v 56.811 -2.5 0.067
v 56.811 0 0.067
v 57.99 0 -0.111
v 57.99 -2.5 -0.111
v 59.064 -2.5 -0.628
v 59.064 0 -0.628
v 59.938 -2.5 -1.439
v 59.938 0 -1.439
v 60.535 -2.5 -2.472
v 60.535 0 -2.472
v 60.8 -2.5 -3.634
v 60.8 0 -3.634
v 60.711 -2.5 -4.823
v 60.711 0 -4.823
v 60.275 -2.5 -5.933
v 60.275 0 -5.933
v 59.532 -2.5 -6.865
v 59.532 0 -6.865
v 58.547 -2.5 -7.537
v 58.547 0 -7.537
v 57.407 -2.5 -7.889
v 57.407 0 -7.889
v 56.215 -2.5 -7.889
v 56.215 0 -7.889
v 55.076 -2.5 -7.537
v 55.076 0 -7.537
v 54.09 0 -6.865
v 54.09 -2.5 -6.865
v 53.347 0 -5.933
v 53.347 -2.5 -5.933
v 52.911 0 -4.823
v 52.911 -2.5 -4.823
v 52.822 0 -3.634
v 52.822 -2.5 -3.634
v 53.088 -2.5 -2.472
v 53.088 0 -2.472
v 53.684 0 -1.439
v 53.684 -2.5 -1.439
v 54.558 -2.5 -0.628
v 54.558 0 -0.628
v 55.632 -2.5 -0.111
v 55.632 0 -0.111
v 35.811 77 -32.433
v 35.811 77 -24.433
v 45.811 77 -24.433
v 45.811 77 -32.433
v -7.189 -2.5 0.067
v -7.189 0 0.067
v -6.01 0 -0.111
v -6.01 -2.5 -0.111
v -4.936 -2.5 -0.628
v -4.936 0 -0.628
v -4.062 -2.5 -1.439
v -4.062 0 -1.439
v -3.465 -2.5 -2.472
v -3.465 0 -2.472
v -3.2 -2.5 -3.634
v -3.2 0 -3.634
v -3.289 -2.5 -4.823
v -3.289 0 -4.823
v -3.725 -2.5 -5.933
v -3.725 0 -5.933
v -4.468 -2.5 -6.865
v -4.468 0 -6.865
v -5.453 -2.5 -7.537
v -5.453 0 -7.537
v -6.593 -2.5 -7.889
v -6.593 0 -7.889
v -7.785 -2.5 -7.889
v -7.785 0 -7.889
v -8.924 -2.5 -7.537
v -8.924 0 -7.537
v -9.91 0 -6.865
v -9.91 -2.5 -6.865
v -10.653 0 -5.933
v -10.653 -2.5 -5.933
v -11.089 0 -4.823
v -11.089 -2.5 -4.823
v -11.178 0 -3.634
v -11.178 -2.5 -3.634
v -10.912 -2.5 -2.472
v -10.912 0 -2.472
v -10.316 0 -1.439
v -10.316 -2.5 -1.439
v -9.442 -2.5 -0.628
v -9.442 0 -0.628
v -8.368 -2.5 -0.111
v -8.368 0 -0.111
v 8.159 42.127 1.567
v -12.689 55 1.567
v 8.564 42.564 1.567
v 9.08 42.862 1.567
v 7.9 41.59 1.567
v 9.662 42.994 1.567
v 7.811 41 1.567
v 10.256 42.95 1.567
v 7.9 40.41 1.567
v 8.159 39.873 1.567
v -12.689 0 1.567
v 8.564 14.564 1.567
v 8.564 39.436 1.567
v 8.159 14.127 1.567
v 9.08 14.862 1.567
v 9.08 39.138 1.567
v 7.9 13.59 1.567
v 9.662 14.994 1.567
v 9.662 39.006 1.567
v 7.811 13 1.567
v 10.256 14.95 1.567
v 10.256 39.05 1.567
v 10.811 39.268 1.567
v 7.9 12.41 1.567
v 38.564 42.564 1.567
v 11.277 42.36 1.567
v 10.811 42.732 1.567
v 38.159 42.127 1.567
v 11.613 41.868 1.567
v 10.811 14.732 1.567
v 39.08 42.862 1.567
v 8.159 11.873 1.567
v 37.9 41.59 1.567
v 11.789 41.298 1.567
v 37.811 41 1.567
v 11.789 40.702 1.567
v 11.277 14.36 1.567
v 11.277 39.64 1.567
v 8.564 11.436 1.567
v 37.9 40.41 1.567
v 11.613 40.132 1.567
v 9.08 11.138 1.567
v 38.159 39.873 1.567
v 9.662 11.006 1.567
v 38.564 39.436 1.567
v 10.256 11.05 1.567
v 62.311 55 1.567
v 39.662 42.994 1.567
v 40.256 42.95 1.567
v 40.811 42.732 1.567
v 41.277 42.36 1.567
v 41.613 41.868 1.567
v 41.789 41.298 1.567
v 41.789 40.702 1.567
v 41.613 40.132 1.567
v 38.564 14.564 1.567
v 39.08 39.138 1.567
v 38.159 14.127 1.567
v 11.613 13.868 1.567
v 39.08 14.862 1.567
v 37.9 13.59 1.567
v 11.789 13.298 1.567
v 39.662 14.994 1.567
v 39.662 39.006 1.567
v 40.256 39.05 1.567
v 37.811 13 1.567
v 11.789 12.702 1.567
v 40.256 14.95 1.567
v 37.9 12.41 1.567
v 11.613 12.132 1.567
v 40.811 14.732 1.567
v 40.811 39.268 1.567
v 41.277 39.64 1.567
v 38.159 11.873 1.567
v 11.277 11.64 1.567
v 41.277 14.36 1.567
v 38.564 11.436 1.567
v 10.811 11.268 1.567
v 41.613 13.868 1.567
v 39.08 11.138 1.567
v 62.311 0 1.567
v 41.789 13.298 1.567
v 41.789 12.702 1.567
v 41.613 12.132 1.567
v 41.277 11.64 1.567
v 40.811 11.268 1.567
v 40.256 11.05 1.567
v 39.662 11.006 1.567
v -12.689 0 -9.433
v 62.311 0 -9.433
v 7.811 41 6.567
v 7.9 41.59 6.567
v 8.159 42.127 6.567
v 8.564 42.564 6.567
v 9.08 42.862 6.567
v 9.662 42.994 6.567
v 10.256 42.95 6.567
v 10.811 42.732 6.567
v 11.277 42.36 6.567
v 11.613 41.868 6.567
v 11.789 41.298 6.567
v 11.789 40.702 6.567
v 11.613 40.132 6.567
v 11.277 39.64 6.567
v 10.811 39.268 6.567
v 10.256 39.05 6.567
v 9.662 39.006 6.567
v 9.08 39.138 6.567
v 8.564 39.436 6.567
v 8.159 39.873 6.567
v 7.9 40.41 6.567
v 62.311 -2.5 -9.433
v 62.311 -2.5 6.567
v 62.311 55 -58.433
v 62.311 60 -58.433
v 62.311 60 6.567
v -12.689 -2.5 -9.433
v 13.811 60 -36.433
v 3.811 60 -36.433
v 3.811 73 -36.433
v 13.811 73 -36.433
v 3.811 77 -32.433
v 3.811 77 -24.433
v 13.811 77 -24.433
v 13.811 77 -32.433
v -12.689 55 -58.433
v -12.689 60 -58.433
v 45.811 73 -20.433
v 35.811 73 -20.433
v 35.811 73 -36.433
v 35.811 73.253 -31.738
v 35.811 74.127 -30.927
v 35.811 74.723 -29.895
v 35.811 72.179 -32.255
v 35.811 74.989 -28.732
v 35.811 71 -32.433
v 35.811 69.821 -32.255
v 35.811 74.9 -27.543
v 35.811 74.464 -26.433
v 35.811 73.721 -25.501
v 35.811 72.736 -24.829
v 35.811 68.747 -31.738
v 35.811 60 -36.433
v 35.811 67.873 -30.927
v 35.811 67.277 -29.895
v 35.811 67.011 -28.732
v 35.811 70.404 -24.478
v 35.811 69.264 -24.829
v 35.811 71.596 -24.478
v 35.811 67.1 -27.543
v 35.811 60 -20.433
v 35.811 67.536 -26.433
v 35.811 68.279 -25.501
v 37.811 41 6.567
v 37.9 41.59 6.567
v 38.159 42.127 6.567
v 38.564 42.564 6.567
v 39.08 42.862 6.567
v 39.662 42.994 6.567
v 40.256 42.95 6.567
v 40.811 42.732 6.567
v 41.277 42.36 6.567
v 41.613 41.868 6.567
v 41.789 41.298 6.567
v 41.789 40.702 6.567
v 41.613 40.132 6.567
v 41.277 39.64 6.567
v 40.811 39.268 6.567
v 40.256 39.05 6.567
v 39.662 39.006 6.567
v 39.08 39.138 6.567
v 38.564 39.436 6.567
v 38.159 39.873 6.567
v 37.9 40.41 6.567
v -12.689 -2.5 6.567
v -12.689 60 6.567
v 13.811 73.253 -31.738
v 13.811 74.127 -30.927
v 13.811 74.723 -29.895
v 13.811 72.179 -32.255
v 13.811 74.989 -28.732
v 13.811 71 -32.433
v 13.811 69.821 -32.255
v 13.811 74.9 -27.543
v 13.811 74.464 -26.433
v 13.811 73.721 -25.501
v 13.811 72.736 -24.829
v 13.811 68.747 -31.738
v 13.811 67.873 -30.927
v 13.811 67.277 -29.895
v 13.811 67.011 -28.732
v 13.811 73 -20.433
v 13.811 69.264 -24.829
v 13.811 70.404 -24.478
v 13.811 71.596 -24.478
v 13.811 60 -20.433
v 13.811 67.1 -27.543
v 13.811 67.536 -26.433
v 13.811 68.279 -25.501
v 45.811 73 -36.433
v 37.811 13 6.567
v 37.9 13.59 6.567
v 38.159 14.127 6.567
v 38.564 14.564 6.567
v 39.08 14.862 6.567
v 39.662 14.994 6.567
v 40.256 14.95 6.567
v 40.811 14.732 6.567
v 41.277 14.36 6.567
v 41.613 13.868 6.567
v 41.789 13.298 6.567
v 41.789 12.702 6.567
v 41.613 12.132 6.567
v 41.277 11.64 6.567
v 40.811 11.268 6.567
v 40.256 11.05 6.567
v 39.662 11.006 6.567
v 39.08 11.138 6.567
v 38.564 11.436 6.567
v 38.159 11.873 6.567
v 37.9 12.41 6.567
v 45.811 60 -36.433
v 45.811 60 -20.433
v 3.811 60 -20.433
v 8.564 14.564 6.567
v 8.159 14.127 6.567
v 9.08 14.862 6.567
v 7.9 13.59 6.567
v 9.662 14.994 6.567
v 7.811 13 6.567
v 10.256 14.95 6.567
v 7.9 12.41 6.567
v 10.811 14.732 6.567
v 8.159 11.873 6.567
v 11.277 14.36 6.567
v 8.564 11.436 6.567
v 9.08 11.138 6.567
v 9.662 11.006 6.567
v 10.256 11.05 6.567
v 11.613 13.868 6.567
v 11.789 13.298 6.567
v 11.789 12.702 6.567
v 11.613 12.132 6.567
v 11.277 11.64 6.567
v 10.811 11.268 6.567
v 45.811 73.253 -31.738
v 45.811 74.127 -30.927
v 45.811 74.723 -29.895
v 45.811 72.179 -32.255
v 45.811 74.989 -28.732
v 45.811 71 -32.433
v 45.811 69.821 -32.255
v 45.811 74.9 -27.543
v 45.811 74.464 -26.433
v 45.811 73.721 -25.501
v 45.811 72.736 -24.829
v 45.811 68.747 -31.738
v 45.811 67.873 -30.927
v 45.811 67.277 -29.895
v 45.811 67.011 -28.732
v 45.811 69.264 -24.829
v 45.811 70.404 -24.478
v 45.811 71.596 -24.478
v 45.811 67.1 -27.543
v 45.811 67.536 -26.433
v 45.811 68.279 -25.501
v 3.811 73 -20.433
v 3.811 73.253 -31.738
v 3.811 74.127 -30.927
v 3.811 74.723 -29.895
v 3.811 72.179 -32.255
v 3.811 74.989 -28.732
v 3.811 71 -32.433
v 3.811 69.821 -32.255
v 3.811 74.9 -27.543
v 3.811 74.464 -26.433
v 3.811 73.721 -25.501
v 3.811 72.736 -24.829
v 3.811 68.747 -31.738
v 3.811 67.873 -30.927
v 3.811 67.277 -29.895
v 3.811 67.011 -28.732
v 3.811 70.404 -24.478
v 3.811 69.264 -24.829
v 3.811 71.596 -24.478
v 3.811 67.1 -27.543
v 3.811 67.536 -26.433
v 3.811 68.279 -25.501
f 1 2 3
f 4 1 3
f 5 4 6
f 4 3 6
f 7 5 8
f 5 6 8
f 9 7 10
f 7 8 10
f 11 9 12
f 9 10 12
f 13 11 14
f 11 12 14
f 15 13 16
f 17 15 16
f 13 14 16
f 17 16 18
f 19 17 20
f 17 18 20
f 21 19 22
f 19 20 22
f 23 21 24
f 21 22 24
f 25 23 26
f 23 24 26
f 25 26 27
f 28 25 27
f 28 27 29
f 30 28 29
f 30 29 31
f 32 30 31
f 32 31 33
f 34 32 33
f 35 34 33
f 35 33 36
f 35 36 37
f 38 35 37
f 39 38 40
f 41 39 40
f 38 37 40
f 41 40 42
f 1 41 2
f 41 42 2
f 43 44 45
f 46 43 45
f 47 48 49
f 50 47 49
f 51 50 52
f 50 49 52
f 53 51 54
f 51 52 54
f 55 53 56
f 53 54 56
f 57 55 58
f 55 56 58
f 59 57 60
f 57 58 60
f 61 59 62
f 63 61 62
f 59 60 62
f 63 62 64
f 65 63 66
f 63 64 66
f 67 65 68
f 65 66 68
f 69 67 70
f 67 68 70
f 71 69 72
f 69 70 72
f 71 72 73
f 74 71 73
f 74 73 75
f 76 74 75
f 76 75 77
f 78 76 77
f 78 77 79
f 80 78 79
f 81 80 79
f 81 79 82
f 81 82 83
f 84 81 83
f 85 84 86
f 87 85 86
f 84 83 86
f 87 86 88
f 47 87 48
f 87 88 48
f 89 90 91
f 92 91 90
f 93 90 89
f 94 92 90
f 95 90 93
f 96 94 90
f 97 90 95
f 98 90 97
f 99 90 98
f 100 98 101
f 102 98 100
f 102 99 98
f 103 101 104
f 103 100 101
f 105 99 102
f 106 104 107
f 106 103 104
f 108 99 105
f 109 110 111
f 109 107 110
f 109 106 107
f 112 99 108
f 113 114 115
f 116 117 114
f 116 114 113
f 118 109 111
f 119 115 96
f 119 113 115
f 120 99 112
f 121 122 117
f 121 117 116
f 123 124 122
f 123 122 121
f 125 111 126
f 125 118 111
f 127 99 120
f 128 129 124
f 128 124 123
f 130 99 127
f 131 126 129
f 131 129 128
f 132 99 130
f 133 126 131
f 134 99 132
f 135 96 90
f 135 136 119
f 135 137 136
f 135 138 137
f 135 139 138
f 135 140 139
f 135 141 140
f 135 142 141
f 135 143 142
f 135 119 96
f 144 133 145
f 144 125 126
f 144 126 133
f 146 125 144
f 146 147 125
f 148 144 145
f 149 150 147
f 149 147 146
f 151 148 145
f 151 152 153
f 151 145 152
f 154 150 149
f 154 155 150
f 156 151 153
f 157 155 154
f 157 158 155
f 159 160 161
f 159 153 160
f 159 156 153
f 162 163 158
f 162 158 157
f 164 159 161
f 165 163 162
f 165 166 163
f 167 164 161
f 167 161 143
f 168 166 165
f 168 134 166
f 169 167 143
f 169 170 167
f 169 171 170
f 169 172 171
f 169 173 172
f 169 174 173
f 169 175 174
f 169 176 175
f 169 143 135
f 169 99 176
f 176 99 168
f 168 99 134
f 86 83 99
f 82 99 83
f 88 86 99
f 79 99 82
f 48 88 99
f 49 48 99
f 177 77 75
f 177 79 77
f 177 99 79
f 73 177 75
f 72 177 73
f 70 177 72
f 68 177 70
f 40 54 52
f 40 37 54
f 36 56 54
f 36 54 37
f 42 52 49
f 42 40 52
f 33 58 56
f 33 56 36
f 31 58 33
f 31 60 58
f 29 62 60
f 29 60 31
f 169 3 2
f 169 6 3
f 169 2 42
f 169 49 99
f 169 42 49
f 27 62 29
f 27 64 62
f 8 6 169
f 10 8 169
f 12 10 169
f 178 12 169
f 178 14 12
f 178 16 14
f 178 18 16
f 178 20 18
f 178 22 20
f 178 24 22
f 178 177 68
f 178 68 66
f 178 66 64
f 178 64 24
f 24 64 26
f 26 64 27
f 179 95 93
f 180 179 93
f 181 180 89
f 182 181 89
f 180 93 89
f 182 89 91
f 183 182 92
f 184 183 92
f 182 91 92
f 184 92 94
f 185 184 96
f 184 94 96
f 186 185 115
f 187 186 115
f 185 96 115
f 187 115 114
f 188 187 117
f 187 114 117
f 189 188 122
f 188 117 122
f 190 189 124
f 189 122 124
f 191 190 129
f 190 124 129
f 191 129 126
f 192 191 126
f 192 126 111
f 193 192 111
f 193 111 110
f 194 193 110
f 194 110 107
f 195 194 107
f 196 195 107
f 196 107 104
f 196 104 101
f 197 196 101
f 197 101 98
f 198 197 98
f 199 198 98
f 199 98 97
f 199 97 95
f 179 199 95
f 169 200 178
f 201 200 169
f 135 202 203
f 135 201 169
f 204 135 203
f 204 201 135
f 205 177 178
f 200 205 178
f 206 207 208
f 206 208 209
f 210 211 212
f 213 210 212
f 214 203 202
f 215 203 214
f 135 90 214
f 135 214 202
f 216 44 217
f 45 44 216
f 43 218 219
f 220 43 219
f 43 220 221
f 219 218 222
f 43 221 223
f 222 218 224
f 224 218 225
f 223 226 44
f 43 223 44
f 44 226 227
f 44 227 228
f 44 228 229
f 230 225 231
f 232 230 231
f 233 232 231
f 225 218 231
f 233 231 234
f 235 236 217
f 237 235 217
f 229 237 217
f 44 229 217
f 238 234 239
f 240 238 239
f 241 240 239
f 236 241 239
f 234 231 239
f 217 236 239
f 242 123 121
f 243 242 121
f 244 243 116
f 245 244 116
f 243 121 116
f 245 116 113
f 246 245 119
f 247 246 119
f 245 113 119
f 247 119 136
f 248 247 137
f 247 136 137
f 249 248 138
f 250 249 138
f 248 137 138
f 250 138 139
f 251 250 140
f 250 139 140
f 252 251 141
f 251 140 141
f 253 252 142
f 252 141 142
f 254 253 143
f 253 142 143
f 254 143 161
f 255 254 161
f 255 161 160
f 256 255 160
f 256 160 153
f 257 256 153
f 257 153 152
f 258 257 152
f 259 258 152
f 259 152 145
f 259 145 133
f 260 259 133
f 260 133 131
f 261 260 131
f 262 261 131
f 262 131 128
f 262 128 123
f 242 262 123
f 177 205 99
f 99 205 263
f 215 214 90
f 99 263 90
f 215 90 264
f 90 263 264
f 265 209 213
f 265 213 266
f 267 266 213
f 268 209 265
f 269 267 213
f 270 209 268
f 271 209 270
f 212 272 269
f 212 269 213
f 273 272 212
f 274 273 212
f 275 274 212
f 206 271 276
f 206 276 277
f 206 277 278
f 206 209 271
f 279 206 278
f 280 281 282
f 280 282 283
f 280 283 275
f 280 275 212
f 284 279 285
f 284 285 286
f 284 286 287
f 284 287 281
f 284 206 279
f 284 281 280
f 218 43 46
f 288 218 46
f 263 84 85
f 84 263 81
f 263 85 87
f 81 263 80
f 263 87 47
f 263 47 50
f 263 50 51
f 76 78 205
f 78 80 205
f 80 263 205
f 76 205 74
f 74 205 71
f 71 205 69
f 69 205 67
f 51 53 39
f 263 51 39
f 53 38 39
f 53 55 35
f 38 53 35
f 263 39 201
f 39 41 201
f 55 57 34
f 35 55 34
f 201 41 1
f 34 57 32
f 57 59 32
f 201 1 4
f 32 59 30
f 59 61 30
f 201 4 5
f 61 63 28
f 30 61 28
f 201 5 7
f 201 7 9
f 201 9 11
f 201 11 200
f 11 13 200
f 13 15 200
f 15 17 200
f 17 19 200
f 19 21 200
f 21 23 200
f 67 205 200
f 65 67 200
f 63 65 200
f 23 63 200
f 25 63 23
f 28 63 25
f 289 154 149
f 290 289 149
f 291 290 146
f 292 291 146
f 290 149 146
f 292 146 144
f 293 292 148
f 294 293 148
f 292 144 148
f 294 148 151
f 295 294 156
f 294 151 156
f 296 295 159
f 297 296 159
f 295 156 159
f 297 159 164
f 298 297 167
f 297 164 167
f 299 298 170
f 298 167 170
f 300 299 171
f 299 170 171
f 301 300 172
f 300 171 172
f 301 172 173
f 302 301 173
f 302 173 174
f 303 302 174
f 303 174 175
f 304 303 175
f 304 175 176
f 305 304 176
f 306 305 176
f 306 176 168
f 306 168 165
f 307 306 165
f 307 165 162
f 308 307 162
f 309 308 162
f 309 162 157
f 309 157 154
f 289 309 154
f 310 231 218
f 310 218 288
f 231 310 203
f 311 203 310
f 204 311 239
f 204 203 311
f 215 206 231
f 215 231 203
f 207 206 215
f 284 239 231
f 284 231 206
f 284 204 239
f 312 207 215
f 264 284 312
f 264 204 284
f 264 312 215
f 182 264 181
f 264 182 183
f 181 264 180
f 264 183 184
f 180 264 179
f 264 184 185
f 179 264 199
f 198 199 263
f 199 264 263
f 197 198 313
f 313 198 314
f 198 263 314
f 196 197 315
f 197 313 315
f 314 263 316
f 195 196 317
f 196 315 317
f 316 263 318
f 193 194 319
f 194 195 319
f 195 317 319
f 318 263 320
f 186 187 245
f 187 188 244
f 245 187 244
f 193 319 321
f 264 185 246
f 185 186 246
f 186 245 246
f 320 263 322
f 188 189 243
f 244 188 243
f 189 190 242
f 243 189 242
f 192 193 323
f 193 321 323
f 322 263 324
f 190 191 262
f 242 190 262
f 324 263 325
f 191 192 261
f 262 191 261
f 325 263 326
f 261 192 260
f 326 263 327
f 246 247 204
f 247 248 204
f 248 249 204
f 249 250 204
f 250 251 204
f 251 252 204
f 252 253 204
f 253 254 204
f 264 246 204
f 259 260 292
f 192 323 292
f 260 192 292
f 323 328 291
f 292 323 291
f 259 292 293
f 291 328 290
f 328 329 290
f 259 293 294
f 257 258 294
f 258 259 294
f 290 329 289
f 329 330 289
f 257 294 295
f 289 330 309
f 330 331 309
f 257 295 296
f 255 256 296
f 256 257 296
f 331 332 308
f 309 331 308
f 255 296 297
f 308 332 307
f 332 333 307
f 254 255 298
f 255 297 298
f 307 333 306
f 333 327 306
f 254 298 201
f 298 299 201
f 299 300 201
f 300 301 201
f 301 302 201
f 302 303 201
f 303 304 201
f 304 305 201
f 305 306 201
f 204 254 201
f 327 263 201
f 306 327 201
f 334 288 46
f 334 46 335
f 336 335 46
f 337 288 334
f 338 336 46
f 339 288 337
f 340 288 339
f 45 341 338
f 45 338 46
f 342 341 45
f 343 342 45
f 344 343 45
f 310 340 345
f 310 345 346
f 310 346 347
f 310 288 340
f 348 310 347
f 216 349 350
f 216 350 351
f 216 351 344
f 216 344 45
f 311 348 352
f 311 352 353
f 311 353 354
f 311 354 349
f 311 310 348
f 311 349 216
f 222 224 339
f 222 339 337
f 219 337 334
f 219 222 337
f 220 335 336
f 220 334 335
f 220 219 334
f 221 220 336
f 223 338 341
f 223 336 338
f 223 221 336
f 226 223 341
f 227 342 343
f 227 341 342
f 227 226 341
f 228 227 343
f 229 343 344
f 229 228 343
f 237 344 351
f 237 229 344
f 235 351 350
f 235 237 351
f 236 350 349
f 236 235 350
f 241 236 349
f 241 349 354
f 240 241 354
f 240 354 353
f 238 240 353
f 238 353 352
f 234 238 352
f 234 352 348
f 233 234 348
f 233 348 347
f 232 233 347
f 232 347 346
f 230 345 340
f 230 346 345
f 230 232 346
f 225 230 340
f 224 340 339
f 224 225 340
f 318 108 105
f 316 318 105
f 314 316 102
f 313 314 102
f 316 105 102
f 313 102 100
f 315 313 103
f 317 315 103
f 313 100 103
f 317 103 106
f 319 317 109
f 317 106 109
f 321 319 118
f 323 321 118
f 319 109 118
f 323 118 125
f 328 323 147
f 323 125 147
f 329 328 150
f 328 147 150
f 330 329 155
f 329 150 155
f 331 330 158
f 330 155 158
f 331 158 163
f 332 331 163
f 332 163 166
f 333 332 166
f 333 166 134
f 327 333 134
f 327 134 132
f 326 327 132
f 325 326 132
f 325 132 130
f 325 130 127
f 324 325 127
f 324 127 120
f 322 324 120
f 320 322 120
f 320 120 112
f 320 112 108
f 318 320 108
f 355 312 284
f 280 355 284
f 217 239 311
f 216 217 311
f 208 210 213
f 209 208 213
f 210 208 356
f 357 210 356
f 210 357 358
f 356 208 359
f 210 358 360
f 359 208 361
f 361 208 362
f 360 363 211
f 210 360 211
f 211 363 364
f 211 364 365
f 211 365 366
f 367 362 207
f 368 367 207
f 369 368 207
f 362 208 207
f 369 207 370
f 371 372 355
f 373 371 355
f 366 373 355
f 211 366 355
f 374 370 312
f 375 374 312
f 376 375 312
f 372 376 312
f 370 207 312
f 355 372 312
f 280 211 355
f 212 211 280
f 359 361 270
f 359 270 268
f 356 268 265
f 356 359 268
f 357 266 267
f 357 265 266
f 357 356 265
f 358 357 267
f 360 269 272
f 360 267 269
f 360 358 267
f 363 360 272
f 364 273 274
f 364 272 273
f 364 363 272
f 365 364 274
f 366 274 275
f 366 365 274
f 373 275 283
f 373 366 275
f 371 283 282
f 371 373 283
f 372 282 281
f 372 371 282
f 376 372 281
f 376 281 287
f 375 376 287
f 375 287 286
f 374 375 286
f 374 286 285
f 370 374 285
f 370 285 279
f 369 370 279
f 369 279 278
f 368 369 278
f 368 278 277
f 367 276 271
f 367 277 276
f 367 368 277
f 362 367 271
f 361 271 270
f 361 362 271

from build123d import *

# Parameters (mm, degrees)
SKETCH_1_W               = 75
SKETCH_1_H               = 16
SKETCH_1_R               = 4
EXTRUDE_1_DEPTH          = 2.5
SKETCH_3_W               = 75
SKETCH_3_H               = 5
EXTRUDE_2_DEPTH          = 60
CUT_EXTRUDE_1_REACH      = 89.199
SKETCH_4_R               = 2
SKETCH_5_W               = 75
SKETCH_5_H               = 5
EXTRUDE_3_DEPTH          = 60
SKETCH_6_W               = 10
SKETCH_6_H               = 16
EXTRUDE_4_DEPTH          = 22
CUT_EXTRUDE_2_DEPTH      = 113.985345572
CUT_EXTRUDE_2_DEPTH_BACK = 113.985345572
SKETCH_7_R               = 4
CHAMFER_1_SIZE           = 4


with BuildPart() as part:
    # 草图1 → 凸台-拉伸1 (new body)
    with BuildSketch(Plane(origin=(0, 0, 0), x_dir=(1, 0, 0), z_dir=(0, 1, 0))):
        with Locations((24.811158798, 1.43319531)):
            Rectangle(SKETCH_1_W, SKETCH_1_H)
        with Locations(Location((-7.188841202, 3.93319531, 0), (0, 0, 270))):
            Circle(SKETCH_1_R, mode=Mode.SUBTRACT)
        with Locations(Location((56.811158798, 3.93319531, 0), (0, 0, 270))):
            Circle(SKETCH_1_R, mode=Mode.SUBTRACT)
    extrude(amount=-EXTRUDE_1_DEPTH)

    # 草图3 → 凸台-拉伸2 (add)
    with BuildSketch(Plane(origin=(0, 0, 0), x_dir=(1, 0, 0), z_dir=(0, 1, 0))):
        with Locations((24.811158798, -4.06680469)):
            Rectangle(SKETCH_3_W, SKETCH_3_H)
    extrude(amount=EXTRUDE_2_DEPTH)

    # 草图4 → 切除-拉伸1 (cut, up to next)
    with BuildSketch(Plane(origin=(0, 0, 1.56680469), x_dir=(-1, 0, 0), z_dir=(0, 0, -1)), mode=Mode.PRIVATE) as cut_extrude_1_sk1:
        with Locations((-9.811158798, 13)):
            Circle(SKETCH_4_R)
    cut_extrude_1_tool1 = extrude(cut_extrude_1_sk1.sketch, amount=-CUT_EXTRUDE_1_REACH, mode=Mode.PRIVATE) & part.part
    # 草图4 → 切除-拉伸1 (cut, up to next)
    with BuildSketch(Plane(origin=(0, 0, 1.56680469), x_dir=(-1, 0, 0), z_dir=(0, 0, -1)), mode=Mode.PRIVATE) as cut_extrude_1_sk2:
        with Locations((-9.811158798, 41)):
            Circle(SKETCH_4_R)
    cut_extrude_1_tool2 = extrude(cut_extrude_1_sk2.sketch, amount=-CUT_EXTRUDE_1_REACH, mode=Mode.PRIVATE) & part.part
    # 草图4 → 切除-拉伸1 (cut, up to next)
    with BuildSketch(Plane(origin=(0, 0, 1.56680469), x_dir=(-1, 0, 0), z_dir=(0, 0, -1)), mode=Mode.PRIVATE) as cut_extrude_1_sk3:
        with Locations((-39.811158798, 41)):
            Circle(SKETCH_4_R)
    cut_extrude_1_tool3 = extrude(cut_extrude_1_sk3.sketch, amount=-CUT_EXTRUDE_1_REACH, mode=Mode.PRIVATE) & part.part
    # 草图4 → 切除-拉伸1 (cut, up to next)
    with BuildSketch(Plane(origin=(0, 0, 1.56680469), x_dir=(-1, 0, 0), z_dir=(0, 0, -1)), mode=Mode.PRIVATE) as cut_extrude_1_sk4:
        with Locations((-39.811158798, 13)):
            Circle(SKETCH_4_R)
    cut_extrude_1_tool4 = extrude(cut_extrude_1_sk4.sketch, amount=-CUT_EXTRUDE_1_REACH, mode=Mode.PRIVATE) & part.part
    add(cut_extrude_1_tool1.solids().sort_by_distance((9.811159, 13, 1.566805))[0], mode=Mode.SUBTRACT)
    add(cut_extrude_1_tool2.solids().sort_by_distance((9.811159, 41, 1.566805))[0], mode=Mode.SUBTRACT)
    add(cut_extrude_1_tool3.solids().sort_by_distance((39.811159, 41, 1.566805))[0], mode=Mode.SUBTRACT)
    add(cut_extrude_1_tool4.solids().sort_by_distance((39.811159, 13, 1.566805))[0], mode=Mode.SUBTRACT)

    # 草图5 → 凸台-拉伸3 (add)
    with BuildSketch(Plane(origin=(0, 0, 1.56680469), x_dir=(-1, 0, 0), z_dir=(0, 0, -1))):
        with Locations((-24.811158798, 57.5)):
            Rectangle(SKETCH_5_W, SKETCH_5_H)
    extrude(amount=EXTRUDE_3_DEPTH)

    # 草图6 → 凸台-拉伸4 (add)
    with BuildSketch(Plane.XZ.offset(-55)):
        with Locations((40.811158798, -28.43319531)):
            Rectangle(SKETCH_6_W, SKETCH_6_H)
        with Locations((8.811158798, -28.43319531)):
            Rectangle(SKETCH_6_W, SKETCH_6_H)
    extrude(amount=-EXTRUDE_4_DEPTH)

    # 草图7 → 切除-拉伸2 (cut, two sides: drawn at the far end of the back side and taken through both)
    with BuildSketch(Plane(origin=(45.811158798, 0, 0), x_dir=(0, 0, -1), z_dir=(1, 0, 0)).offset(-CUT_EXTRUDE_2_DEPTH_BACK)):
        with Locations((28.43319531, 71)):
            Circle(SKETCH_7_R)
    extrude(amount=CUT_EXTRUDE_2_DEPTH + CUT_EXTRUDE_2_DEPTH_BACK, mode=Mode.SUBTRACT)

    # 倒角1
    chamfer_1_edges = [part.edges().sort_by_distance(p)[0] for p in [
        (40.811158798, 77, -20.43319531),
        (40.811158798, 77, -36.43319531),
        (8.811158798, 77, -36.43319531),
        (8.811158798, 77, -20.43319531),
    ]]
    chamfer(chamfer_1_edges, length=CHAMFER_1_SIZE)


solid = part.part
